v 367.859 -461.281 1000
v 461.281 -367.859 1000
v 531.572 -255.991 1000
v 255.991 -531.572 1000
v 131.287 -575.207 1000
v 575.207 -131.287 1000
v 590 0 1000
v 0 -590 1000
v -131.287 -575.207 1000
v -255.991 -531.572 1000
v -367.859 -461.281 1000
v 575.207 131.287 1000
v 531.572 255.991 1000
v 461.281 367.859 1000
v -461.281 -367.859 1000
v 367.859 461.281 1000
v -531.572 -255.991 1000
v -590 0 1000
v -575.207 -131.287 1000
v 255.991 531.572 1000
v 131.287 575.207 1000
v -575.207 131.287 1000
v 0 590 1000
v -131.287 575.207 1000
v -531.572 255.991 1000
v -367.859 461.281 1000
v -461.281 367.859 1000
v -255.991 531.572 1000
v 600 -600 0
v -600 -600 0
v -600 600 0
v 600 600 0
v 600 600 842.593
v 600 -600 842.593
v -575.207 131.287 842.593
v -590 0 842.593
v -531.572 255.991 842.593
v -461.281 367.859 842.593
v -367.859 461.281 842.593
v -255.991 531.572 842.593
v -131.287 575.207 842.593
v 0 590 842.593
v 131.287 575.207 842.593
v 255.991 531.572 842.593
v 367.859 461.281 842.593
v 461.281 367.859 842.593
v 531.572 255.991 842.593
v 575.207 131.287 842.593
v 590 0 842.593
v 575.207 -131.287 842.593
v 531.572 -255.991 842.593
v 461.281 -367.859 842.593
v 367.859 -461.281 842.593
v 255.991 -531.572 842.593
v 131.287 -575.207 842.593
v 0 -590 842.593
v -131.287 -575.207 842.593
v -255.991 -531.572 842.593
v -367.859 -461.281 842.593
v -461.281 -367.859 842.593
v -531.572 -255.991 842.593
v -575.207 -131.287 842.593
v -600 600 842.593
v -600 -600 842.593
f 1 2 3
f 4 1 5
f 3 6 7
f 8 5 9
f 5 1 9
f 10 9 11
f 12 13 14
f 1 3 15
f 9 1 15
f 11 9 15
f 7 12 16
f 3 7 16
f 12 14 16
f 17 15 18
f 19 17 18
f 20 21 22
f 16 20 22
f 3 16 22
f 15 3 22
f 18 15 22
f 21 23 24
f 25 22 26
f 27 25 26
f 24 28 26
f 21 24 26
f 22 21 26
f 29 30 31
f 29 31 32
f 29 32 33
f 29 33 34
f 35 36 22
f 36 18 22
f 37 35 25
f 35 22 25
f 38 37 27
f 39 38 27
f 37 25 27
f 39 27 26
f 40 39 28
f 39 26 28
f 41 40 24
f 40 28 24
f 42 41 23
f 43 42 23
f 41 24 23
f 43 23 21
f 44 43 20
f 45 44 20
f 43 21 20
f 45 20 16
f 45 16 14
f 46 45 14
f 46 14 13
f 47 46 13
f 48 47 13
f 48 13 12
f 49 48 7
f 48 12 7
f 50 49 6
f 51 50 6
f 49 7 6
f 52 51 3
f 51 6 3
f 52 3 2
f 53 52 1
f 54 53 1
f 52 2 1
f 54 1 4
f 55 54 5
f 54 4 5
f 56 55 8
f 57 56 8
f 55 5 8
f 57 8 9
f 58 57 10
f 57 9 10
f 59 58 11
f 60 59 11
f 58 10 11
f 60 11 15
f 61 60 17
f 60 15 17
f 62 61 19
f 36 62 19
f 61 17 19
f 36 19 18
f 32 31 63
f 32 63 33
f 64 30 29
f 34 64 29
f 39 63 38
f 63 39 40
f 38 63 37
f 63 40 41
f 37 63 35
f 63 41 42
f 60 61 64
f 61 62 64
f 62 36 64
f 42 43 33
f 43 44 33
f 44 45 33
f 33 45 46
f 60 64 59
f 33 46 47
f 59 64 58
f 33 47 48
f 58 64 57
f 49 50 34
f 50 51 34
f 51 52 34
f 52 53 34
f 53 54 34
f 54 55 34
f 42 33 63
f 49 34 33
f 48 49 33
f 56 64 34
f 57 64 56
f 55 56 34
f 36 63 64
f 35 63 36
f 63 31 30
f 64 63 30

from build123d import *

# Parameters (mm, degrees)
F0_W     = 590
F0_H     = 157.407396
F2_W     = 1200
F2_H     = 1200
F3_DEPTH = 842.592604


with BuildPart() as f1:
    # F0 (on Front) → F1 (revolve)
    with BuildSketch(Plane.XZ):
        Polygon((-600, 842.592604), (-600, 0), (0, 0), (0, 842.592604), (-590, 842.592604), align=None)
        with Locations((-295, 921.296302)):
            Rectangle(F0_W, F0_H)
    revolve(axis=Axis((0, 0, 487.345502), (0, 0, -1)))

    # F2 (on face) → F3 (join, through all)
    with BuildSketch(Plane(origin=(0, 0, 0), x_dir=(1, 0, 0), z_dir=(0, 0, -1))):
        Rectangle(F2_W, F2_H)
    extrude(amount=-F3_DEPTH)


solid = f1.part
